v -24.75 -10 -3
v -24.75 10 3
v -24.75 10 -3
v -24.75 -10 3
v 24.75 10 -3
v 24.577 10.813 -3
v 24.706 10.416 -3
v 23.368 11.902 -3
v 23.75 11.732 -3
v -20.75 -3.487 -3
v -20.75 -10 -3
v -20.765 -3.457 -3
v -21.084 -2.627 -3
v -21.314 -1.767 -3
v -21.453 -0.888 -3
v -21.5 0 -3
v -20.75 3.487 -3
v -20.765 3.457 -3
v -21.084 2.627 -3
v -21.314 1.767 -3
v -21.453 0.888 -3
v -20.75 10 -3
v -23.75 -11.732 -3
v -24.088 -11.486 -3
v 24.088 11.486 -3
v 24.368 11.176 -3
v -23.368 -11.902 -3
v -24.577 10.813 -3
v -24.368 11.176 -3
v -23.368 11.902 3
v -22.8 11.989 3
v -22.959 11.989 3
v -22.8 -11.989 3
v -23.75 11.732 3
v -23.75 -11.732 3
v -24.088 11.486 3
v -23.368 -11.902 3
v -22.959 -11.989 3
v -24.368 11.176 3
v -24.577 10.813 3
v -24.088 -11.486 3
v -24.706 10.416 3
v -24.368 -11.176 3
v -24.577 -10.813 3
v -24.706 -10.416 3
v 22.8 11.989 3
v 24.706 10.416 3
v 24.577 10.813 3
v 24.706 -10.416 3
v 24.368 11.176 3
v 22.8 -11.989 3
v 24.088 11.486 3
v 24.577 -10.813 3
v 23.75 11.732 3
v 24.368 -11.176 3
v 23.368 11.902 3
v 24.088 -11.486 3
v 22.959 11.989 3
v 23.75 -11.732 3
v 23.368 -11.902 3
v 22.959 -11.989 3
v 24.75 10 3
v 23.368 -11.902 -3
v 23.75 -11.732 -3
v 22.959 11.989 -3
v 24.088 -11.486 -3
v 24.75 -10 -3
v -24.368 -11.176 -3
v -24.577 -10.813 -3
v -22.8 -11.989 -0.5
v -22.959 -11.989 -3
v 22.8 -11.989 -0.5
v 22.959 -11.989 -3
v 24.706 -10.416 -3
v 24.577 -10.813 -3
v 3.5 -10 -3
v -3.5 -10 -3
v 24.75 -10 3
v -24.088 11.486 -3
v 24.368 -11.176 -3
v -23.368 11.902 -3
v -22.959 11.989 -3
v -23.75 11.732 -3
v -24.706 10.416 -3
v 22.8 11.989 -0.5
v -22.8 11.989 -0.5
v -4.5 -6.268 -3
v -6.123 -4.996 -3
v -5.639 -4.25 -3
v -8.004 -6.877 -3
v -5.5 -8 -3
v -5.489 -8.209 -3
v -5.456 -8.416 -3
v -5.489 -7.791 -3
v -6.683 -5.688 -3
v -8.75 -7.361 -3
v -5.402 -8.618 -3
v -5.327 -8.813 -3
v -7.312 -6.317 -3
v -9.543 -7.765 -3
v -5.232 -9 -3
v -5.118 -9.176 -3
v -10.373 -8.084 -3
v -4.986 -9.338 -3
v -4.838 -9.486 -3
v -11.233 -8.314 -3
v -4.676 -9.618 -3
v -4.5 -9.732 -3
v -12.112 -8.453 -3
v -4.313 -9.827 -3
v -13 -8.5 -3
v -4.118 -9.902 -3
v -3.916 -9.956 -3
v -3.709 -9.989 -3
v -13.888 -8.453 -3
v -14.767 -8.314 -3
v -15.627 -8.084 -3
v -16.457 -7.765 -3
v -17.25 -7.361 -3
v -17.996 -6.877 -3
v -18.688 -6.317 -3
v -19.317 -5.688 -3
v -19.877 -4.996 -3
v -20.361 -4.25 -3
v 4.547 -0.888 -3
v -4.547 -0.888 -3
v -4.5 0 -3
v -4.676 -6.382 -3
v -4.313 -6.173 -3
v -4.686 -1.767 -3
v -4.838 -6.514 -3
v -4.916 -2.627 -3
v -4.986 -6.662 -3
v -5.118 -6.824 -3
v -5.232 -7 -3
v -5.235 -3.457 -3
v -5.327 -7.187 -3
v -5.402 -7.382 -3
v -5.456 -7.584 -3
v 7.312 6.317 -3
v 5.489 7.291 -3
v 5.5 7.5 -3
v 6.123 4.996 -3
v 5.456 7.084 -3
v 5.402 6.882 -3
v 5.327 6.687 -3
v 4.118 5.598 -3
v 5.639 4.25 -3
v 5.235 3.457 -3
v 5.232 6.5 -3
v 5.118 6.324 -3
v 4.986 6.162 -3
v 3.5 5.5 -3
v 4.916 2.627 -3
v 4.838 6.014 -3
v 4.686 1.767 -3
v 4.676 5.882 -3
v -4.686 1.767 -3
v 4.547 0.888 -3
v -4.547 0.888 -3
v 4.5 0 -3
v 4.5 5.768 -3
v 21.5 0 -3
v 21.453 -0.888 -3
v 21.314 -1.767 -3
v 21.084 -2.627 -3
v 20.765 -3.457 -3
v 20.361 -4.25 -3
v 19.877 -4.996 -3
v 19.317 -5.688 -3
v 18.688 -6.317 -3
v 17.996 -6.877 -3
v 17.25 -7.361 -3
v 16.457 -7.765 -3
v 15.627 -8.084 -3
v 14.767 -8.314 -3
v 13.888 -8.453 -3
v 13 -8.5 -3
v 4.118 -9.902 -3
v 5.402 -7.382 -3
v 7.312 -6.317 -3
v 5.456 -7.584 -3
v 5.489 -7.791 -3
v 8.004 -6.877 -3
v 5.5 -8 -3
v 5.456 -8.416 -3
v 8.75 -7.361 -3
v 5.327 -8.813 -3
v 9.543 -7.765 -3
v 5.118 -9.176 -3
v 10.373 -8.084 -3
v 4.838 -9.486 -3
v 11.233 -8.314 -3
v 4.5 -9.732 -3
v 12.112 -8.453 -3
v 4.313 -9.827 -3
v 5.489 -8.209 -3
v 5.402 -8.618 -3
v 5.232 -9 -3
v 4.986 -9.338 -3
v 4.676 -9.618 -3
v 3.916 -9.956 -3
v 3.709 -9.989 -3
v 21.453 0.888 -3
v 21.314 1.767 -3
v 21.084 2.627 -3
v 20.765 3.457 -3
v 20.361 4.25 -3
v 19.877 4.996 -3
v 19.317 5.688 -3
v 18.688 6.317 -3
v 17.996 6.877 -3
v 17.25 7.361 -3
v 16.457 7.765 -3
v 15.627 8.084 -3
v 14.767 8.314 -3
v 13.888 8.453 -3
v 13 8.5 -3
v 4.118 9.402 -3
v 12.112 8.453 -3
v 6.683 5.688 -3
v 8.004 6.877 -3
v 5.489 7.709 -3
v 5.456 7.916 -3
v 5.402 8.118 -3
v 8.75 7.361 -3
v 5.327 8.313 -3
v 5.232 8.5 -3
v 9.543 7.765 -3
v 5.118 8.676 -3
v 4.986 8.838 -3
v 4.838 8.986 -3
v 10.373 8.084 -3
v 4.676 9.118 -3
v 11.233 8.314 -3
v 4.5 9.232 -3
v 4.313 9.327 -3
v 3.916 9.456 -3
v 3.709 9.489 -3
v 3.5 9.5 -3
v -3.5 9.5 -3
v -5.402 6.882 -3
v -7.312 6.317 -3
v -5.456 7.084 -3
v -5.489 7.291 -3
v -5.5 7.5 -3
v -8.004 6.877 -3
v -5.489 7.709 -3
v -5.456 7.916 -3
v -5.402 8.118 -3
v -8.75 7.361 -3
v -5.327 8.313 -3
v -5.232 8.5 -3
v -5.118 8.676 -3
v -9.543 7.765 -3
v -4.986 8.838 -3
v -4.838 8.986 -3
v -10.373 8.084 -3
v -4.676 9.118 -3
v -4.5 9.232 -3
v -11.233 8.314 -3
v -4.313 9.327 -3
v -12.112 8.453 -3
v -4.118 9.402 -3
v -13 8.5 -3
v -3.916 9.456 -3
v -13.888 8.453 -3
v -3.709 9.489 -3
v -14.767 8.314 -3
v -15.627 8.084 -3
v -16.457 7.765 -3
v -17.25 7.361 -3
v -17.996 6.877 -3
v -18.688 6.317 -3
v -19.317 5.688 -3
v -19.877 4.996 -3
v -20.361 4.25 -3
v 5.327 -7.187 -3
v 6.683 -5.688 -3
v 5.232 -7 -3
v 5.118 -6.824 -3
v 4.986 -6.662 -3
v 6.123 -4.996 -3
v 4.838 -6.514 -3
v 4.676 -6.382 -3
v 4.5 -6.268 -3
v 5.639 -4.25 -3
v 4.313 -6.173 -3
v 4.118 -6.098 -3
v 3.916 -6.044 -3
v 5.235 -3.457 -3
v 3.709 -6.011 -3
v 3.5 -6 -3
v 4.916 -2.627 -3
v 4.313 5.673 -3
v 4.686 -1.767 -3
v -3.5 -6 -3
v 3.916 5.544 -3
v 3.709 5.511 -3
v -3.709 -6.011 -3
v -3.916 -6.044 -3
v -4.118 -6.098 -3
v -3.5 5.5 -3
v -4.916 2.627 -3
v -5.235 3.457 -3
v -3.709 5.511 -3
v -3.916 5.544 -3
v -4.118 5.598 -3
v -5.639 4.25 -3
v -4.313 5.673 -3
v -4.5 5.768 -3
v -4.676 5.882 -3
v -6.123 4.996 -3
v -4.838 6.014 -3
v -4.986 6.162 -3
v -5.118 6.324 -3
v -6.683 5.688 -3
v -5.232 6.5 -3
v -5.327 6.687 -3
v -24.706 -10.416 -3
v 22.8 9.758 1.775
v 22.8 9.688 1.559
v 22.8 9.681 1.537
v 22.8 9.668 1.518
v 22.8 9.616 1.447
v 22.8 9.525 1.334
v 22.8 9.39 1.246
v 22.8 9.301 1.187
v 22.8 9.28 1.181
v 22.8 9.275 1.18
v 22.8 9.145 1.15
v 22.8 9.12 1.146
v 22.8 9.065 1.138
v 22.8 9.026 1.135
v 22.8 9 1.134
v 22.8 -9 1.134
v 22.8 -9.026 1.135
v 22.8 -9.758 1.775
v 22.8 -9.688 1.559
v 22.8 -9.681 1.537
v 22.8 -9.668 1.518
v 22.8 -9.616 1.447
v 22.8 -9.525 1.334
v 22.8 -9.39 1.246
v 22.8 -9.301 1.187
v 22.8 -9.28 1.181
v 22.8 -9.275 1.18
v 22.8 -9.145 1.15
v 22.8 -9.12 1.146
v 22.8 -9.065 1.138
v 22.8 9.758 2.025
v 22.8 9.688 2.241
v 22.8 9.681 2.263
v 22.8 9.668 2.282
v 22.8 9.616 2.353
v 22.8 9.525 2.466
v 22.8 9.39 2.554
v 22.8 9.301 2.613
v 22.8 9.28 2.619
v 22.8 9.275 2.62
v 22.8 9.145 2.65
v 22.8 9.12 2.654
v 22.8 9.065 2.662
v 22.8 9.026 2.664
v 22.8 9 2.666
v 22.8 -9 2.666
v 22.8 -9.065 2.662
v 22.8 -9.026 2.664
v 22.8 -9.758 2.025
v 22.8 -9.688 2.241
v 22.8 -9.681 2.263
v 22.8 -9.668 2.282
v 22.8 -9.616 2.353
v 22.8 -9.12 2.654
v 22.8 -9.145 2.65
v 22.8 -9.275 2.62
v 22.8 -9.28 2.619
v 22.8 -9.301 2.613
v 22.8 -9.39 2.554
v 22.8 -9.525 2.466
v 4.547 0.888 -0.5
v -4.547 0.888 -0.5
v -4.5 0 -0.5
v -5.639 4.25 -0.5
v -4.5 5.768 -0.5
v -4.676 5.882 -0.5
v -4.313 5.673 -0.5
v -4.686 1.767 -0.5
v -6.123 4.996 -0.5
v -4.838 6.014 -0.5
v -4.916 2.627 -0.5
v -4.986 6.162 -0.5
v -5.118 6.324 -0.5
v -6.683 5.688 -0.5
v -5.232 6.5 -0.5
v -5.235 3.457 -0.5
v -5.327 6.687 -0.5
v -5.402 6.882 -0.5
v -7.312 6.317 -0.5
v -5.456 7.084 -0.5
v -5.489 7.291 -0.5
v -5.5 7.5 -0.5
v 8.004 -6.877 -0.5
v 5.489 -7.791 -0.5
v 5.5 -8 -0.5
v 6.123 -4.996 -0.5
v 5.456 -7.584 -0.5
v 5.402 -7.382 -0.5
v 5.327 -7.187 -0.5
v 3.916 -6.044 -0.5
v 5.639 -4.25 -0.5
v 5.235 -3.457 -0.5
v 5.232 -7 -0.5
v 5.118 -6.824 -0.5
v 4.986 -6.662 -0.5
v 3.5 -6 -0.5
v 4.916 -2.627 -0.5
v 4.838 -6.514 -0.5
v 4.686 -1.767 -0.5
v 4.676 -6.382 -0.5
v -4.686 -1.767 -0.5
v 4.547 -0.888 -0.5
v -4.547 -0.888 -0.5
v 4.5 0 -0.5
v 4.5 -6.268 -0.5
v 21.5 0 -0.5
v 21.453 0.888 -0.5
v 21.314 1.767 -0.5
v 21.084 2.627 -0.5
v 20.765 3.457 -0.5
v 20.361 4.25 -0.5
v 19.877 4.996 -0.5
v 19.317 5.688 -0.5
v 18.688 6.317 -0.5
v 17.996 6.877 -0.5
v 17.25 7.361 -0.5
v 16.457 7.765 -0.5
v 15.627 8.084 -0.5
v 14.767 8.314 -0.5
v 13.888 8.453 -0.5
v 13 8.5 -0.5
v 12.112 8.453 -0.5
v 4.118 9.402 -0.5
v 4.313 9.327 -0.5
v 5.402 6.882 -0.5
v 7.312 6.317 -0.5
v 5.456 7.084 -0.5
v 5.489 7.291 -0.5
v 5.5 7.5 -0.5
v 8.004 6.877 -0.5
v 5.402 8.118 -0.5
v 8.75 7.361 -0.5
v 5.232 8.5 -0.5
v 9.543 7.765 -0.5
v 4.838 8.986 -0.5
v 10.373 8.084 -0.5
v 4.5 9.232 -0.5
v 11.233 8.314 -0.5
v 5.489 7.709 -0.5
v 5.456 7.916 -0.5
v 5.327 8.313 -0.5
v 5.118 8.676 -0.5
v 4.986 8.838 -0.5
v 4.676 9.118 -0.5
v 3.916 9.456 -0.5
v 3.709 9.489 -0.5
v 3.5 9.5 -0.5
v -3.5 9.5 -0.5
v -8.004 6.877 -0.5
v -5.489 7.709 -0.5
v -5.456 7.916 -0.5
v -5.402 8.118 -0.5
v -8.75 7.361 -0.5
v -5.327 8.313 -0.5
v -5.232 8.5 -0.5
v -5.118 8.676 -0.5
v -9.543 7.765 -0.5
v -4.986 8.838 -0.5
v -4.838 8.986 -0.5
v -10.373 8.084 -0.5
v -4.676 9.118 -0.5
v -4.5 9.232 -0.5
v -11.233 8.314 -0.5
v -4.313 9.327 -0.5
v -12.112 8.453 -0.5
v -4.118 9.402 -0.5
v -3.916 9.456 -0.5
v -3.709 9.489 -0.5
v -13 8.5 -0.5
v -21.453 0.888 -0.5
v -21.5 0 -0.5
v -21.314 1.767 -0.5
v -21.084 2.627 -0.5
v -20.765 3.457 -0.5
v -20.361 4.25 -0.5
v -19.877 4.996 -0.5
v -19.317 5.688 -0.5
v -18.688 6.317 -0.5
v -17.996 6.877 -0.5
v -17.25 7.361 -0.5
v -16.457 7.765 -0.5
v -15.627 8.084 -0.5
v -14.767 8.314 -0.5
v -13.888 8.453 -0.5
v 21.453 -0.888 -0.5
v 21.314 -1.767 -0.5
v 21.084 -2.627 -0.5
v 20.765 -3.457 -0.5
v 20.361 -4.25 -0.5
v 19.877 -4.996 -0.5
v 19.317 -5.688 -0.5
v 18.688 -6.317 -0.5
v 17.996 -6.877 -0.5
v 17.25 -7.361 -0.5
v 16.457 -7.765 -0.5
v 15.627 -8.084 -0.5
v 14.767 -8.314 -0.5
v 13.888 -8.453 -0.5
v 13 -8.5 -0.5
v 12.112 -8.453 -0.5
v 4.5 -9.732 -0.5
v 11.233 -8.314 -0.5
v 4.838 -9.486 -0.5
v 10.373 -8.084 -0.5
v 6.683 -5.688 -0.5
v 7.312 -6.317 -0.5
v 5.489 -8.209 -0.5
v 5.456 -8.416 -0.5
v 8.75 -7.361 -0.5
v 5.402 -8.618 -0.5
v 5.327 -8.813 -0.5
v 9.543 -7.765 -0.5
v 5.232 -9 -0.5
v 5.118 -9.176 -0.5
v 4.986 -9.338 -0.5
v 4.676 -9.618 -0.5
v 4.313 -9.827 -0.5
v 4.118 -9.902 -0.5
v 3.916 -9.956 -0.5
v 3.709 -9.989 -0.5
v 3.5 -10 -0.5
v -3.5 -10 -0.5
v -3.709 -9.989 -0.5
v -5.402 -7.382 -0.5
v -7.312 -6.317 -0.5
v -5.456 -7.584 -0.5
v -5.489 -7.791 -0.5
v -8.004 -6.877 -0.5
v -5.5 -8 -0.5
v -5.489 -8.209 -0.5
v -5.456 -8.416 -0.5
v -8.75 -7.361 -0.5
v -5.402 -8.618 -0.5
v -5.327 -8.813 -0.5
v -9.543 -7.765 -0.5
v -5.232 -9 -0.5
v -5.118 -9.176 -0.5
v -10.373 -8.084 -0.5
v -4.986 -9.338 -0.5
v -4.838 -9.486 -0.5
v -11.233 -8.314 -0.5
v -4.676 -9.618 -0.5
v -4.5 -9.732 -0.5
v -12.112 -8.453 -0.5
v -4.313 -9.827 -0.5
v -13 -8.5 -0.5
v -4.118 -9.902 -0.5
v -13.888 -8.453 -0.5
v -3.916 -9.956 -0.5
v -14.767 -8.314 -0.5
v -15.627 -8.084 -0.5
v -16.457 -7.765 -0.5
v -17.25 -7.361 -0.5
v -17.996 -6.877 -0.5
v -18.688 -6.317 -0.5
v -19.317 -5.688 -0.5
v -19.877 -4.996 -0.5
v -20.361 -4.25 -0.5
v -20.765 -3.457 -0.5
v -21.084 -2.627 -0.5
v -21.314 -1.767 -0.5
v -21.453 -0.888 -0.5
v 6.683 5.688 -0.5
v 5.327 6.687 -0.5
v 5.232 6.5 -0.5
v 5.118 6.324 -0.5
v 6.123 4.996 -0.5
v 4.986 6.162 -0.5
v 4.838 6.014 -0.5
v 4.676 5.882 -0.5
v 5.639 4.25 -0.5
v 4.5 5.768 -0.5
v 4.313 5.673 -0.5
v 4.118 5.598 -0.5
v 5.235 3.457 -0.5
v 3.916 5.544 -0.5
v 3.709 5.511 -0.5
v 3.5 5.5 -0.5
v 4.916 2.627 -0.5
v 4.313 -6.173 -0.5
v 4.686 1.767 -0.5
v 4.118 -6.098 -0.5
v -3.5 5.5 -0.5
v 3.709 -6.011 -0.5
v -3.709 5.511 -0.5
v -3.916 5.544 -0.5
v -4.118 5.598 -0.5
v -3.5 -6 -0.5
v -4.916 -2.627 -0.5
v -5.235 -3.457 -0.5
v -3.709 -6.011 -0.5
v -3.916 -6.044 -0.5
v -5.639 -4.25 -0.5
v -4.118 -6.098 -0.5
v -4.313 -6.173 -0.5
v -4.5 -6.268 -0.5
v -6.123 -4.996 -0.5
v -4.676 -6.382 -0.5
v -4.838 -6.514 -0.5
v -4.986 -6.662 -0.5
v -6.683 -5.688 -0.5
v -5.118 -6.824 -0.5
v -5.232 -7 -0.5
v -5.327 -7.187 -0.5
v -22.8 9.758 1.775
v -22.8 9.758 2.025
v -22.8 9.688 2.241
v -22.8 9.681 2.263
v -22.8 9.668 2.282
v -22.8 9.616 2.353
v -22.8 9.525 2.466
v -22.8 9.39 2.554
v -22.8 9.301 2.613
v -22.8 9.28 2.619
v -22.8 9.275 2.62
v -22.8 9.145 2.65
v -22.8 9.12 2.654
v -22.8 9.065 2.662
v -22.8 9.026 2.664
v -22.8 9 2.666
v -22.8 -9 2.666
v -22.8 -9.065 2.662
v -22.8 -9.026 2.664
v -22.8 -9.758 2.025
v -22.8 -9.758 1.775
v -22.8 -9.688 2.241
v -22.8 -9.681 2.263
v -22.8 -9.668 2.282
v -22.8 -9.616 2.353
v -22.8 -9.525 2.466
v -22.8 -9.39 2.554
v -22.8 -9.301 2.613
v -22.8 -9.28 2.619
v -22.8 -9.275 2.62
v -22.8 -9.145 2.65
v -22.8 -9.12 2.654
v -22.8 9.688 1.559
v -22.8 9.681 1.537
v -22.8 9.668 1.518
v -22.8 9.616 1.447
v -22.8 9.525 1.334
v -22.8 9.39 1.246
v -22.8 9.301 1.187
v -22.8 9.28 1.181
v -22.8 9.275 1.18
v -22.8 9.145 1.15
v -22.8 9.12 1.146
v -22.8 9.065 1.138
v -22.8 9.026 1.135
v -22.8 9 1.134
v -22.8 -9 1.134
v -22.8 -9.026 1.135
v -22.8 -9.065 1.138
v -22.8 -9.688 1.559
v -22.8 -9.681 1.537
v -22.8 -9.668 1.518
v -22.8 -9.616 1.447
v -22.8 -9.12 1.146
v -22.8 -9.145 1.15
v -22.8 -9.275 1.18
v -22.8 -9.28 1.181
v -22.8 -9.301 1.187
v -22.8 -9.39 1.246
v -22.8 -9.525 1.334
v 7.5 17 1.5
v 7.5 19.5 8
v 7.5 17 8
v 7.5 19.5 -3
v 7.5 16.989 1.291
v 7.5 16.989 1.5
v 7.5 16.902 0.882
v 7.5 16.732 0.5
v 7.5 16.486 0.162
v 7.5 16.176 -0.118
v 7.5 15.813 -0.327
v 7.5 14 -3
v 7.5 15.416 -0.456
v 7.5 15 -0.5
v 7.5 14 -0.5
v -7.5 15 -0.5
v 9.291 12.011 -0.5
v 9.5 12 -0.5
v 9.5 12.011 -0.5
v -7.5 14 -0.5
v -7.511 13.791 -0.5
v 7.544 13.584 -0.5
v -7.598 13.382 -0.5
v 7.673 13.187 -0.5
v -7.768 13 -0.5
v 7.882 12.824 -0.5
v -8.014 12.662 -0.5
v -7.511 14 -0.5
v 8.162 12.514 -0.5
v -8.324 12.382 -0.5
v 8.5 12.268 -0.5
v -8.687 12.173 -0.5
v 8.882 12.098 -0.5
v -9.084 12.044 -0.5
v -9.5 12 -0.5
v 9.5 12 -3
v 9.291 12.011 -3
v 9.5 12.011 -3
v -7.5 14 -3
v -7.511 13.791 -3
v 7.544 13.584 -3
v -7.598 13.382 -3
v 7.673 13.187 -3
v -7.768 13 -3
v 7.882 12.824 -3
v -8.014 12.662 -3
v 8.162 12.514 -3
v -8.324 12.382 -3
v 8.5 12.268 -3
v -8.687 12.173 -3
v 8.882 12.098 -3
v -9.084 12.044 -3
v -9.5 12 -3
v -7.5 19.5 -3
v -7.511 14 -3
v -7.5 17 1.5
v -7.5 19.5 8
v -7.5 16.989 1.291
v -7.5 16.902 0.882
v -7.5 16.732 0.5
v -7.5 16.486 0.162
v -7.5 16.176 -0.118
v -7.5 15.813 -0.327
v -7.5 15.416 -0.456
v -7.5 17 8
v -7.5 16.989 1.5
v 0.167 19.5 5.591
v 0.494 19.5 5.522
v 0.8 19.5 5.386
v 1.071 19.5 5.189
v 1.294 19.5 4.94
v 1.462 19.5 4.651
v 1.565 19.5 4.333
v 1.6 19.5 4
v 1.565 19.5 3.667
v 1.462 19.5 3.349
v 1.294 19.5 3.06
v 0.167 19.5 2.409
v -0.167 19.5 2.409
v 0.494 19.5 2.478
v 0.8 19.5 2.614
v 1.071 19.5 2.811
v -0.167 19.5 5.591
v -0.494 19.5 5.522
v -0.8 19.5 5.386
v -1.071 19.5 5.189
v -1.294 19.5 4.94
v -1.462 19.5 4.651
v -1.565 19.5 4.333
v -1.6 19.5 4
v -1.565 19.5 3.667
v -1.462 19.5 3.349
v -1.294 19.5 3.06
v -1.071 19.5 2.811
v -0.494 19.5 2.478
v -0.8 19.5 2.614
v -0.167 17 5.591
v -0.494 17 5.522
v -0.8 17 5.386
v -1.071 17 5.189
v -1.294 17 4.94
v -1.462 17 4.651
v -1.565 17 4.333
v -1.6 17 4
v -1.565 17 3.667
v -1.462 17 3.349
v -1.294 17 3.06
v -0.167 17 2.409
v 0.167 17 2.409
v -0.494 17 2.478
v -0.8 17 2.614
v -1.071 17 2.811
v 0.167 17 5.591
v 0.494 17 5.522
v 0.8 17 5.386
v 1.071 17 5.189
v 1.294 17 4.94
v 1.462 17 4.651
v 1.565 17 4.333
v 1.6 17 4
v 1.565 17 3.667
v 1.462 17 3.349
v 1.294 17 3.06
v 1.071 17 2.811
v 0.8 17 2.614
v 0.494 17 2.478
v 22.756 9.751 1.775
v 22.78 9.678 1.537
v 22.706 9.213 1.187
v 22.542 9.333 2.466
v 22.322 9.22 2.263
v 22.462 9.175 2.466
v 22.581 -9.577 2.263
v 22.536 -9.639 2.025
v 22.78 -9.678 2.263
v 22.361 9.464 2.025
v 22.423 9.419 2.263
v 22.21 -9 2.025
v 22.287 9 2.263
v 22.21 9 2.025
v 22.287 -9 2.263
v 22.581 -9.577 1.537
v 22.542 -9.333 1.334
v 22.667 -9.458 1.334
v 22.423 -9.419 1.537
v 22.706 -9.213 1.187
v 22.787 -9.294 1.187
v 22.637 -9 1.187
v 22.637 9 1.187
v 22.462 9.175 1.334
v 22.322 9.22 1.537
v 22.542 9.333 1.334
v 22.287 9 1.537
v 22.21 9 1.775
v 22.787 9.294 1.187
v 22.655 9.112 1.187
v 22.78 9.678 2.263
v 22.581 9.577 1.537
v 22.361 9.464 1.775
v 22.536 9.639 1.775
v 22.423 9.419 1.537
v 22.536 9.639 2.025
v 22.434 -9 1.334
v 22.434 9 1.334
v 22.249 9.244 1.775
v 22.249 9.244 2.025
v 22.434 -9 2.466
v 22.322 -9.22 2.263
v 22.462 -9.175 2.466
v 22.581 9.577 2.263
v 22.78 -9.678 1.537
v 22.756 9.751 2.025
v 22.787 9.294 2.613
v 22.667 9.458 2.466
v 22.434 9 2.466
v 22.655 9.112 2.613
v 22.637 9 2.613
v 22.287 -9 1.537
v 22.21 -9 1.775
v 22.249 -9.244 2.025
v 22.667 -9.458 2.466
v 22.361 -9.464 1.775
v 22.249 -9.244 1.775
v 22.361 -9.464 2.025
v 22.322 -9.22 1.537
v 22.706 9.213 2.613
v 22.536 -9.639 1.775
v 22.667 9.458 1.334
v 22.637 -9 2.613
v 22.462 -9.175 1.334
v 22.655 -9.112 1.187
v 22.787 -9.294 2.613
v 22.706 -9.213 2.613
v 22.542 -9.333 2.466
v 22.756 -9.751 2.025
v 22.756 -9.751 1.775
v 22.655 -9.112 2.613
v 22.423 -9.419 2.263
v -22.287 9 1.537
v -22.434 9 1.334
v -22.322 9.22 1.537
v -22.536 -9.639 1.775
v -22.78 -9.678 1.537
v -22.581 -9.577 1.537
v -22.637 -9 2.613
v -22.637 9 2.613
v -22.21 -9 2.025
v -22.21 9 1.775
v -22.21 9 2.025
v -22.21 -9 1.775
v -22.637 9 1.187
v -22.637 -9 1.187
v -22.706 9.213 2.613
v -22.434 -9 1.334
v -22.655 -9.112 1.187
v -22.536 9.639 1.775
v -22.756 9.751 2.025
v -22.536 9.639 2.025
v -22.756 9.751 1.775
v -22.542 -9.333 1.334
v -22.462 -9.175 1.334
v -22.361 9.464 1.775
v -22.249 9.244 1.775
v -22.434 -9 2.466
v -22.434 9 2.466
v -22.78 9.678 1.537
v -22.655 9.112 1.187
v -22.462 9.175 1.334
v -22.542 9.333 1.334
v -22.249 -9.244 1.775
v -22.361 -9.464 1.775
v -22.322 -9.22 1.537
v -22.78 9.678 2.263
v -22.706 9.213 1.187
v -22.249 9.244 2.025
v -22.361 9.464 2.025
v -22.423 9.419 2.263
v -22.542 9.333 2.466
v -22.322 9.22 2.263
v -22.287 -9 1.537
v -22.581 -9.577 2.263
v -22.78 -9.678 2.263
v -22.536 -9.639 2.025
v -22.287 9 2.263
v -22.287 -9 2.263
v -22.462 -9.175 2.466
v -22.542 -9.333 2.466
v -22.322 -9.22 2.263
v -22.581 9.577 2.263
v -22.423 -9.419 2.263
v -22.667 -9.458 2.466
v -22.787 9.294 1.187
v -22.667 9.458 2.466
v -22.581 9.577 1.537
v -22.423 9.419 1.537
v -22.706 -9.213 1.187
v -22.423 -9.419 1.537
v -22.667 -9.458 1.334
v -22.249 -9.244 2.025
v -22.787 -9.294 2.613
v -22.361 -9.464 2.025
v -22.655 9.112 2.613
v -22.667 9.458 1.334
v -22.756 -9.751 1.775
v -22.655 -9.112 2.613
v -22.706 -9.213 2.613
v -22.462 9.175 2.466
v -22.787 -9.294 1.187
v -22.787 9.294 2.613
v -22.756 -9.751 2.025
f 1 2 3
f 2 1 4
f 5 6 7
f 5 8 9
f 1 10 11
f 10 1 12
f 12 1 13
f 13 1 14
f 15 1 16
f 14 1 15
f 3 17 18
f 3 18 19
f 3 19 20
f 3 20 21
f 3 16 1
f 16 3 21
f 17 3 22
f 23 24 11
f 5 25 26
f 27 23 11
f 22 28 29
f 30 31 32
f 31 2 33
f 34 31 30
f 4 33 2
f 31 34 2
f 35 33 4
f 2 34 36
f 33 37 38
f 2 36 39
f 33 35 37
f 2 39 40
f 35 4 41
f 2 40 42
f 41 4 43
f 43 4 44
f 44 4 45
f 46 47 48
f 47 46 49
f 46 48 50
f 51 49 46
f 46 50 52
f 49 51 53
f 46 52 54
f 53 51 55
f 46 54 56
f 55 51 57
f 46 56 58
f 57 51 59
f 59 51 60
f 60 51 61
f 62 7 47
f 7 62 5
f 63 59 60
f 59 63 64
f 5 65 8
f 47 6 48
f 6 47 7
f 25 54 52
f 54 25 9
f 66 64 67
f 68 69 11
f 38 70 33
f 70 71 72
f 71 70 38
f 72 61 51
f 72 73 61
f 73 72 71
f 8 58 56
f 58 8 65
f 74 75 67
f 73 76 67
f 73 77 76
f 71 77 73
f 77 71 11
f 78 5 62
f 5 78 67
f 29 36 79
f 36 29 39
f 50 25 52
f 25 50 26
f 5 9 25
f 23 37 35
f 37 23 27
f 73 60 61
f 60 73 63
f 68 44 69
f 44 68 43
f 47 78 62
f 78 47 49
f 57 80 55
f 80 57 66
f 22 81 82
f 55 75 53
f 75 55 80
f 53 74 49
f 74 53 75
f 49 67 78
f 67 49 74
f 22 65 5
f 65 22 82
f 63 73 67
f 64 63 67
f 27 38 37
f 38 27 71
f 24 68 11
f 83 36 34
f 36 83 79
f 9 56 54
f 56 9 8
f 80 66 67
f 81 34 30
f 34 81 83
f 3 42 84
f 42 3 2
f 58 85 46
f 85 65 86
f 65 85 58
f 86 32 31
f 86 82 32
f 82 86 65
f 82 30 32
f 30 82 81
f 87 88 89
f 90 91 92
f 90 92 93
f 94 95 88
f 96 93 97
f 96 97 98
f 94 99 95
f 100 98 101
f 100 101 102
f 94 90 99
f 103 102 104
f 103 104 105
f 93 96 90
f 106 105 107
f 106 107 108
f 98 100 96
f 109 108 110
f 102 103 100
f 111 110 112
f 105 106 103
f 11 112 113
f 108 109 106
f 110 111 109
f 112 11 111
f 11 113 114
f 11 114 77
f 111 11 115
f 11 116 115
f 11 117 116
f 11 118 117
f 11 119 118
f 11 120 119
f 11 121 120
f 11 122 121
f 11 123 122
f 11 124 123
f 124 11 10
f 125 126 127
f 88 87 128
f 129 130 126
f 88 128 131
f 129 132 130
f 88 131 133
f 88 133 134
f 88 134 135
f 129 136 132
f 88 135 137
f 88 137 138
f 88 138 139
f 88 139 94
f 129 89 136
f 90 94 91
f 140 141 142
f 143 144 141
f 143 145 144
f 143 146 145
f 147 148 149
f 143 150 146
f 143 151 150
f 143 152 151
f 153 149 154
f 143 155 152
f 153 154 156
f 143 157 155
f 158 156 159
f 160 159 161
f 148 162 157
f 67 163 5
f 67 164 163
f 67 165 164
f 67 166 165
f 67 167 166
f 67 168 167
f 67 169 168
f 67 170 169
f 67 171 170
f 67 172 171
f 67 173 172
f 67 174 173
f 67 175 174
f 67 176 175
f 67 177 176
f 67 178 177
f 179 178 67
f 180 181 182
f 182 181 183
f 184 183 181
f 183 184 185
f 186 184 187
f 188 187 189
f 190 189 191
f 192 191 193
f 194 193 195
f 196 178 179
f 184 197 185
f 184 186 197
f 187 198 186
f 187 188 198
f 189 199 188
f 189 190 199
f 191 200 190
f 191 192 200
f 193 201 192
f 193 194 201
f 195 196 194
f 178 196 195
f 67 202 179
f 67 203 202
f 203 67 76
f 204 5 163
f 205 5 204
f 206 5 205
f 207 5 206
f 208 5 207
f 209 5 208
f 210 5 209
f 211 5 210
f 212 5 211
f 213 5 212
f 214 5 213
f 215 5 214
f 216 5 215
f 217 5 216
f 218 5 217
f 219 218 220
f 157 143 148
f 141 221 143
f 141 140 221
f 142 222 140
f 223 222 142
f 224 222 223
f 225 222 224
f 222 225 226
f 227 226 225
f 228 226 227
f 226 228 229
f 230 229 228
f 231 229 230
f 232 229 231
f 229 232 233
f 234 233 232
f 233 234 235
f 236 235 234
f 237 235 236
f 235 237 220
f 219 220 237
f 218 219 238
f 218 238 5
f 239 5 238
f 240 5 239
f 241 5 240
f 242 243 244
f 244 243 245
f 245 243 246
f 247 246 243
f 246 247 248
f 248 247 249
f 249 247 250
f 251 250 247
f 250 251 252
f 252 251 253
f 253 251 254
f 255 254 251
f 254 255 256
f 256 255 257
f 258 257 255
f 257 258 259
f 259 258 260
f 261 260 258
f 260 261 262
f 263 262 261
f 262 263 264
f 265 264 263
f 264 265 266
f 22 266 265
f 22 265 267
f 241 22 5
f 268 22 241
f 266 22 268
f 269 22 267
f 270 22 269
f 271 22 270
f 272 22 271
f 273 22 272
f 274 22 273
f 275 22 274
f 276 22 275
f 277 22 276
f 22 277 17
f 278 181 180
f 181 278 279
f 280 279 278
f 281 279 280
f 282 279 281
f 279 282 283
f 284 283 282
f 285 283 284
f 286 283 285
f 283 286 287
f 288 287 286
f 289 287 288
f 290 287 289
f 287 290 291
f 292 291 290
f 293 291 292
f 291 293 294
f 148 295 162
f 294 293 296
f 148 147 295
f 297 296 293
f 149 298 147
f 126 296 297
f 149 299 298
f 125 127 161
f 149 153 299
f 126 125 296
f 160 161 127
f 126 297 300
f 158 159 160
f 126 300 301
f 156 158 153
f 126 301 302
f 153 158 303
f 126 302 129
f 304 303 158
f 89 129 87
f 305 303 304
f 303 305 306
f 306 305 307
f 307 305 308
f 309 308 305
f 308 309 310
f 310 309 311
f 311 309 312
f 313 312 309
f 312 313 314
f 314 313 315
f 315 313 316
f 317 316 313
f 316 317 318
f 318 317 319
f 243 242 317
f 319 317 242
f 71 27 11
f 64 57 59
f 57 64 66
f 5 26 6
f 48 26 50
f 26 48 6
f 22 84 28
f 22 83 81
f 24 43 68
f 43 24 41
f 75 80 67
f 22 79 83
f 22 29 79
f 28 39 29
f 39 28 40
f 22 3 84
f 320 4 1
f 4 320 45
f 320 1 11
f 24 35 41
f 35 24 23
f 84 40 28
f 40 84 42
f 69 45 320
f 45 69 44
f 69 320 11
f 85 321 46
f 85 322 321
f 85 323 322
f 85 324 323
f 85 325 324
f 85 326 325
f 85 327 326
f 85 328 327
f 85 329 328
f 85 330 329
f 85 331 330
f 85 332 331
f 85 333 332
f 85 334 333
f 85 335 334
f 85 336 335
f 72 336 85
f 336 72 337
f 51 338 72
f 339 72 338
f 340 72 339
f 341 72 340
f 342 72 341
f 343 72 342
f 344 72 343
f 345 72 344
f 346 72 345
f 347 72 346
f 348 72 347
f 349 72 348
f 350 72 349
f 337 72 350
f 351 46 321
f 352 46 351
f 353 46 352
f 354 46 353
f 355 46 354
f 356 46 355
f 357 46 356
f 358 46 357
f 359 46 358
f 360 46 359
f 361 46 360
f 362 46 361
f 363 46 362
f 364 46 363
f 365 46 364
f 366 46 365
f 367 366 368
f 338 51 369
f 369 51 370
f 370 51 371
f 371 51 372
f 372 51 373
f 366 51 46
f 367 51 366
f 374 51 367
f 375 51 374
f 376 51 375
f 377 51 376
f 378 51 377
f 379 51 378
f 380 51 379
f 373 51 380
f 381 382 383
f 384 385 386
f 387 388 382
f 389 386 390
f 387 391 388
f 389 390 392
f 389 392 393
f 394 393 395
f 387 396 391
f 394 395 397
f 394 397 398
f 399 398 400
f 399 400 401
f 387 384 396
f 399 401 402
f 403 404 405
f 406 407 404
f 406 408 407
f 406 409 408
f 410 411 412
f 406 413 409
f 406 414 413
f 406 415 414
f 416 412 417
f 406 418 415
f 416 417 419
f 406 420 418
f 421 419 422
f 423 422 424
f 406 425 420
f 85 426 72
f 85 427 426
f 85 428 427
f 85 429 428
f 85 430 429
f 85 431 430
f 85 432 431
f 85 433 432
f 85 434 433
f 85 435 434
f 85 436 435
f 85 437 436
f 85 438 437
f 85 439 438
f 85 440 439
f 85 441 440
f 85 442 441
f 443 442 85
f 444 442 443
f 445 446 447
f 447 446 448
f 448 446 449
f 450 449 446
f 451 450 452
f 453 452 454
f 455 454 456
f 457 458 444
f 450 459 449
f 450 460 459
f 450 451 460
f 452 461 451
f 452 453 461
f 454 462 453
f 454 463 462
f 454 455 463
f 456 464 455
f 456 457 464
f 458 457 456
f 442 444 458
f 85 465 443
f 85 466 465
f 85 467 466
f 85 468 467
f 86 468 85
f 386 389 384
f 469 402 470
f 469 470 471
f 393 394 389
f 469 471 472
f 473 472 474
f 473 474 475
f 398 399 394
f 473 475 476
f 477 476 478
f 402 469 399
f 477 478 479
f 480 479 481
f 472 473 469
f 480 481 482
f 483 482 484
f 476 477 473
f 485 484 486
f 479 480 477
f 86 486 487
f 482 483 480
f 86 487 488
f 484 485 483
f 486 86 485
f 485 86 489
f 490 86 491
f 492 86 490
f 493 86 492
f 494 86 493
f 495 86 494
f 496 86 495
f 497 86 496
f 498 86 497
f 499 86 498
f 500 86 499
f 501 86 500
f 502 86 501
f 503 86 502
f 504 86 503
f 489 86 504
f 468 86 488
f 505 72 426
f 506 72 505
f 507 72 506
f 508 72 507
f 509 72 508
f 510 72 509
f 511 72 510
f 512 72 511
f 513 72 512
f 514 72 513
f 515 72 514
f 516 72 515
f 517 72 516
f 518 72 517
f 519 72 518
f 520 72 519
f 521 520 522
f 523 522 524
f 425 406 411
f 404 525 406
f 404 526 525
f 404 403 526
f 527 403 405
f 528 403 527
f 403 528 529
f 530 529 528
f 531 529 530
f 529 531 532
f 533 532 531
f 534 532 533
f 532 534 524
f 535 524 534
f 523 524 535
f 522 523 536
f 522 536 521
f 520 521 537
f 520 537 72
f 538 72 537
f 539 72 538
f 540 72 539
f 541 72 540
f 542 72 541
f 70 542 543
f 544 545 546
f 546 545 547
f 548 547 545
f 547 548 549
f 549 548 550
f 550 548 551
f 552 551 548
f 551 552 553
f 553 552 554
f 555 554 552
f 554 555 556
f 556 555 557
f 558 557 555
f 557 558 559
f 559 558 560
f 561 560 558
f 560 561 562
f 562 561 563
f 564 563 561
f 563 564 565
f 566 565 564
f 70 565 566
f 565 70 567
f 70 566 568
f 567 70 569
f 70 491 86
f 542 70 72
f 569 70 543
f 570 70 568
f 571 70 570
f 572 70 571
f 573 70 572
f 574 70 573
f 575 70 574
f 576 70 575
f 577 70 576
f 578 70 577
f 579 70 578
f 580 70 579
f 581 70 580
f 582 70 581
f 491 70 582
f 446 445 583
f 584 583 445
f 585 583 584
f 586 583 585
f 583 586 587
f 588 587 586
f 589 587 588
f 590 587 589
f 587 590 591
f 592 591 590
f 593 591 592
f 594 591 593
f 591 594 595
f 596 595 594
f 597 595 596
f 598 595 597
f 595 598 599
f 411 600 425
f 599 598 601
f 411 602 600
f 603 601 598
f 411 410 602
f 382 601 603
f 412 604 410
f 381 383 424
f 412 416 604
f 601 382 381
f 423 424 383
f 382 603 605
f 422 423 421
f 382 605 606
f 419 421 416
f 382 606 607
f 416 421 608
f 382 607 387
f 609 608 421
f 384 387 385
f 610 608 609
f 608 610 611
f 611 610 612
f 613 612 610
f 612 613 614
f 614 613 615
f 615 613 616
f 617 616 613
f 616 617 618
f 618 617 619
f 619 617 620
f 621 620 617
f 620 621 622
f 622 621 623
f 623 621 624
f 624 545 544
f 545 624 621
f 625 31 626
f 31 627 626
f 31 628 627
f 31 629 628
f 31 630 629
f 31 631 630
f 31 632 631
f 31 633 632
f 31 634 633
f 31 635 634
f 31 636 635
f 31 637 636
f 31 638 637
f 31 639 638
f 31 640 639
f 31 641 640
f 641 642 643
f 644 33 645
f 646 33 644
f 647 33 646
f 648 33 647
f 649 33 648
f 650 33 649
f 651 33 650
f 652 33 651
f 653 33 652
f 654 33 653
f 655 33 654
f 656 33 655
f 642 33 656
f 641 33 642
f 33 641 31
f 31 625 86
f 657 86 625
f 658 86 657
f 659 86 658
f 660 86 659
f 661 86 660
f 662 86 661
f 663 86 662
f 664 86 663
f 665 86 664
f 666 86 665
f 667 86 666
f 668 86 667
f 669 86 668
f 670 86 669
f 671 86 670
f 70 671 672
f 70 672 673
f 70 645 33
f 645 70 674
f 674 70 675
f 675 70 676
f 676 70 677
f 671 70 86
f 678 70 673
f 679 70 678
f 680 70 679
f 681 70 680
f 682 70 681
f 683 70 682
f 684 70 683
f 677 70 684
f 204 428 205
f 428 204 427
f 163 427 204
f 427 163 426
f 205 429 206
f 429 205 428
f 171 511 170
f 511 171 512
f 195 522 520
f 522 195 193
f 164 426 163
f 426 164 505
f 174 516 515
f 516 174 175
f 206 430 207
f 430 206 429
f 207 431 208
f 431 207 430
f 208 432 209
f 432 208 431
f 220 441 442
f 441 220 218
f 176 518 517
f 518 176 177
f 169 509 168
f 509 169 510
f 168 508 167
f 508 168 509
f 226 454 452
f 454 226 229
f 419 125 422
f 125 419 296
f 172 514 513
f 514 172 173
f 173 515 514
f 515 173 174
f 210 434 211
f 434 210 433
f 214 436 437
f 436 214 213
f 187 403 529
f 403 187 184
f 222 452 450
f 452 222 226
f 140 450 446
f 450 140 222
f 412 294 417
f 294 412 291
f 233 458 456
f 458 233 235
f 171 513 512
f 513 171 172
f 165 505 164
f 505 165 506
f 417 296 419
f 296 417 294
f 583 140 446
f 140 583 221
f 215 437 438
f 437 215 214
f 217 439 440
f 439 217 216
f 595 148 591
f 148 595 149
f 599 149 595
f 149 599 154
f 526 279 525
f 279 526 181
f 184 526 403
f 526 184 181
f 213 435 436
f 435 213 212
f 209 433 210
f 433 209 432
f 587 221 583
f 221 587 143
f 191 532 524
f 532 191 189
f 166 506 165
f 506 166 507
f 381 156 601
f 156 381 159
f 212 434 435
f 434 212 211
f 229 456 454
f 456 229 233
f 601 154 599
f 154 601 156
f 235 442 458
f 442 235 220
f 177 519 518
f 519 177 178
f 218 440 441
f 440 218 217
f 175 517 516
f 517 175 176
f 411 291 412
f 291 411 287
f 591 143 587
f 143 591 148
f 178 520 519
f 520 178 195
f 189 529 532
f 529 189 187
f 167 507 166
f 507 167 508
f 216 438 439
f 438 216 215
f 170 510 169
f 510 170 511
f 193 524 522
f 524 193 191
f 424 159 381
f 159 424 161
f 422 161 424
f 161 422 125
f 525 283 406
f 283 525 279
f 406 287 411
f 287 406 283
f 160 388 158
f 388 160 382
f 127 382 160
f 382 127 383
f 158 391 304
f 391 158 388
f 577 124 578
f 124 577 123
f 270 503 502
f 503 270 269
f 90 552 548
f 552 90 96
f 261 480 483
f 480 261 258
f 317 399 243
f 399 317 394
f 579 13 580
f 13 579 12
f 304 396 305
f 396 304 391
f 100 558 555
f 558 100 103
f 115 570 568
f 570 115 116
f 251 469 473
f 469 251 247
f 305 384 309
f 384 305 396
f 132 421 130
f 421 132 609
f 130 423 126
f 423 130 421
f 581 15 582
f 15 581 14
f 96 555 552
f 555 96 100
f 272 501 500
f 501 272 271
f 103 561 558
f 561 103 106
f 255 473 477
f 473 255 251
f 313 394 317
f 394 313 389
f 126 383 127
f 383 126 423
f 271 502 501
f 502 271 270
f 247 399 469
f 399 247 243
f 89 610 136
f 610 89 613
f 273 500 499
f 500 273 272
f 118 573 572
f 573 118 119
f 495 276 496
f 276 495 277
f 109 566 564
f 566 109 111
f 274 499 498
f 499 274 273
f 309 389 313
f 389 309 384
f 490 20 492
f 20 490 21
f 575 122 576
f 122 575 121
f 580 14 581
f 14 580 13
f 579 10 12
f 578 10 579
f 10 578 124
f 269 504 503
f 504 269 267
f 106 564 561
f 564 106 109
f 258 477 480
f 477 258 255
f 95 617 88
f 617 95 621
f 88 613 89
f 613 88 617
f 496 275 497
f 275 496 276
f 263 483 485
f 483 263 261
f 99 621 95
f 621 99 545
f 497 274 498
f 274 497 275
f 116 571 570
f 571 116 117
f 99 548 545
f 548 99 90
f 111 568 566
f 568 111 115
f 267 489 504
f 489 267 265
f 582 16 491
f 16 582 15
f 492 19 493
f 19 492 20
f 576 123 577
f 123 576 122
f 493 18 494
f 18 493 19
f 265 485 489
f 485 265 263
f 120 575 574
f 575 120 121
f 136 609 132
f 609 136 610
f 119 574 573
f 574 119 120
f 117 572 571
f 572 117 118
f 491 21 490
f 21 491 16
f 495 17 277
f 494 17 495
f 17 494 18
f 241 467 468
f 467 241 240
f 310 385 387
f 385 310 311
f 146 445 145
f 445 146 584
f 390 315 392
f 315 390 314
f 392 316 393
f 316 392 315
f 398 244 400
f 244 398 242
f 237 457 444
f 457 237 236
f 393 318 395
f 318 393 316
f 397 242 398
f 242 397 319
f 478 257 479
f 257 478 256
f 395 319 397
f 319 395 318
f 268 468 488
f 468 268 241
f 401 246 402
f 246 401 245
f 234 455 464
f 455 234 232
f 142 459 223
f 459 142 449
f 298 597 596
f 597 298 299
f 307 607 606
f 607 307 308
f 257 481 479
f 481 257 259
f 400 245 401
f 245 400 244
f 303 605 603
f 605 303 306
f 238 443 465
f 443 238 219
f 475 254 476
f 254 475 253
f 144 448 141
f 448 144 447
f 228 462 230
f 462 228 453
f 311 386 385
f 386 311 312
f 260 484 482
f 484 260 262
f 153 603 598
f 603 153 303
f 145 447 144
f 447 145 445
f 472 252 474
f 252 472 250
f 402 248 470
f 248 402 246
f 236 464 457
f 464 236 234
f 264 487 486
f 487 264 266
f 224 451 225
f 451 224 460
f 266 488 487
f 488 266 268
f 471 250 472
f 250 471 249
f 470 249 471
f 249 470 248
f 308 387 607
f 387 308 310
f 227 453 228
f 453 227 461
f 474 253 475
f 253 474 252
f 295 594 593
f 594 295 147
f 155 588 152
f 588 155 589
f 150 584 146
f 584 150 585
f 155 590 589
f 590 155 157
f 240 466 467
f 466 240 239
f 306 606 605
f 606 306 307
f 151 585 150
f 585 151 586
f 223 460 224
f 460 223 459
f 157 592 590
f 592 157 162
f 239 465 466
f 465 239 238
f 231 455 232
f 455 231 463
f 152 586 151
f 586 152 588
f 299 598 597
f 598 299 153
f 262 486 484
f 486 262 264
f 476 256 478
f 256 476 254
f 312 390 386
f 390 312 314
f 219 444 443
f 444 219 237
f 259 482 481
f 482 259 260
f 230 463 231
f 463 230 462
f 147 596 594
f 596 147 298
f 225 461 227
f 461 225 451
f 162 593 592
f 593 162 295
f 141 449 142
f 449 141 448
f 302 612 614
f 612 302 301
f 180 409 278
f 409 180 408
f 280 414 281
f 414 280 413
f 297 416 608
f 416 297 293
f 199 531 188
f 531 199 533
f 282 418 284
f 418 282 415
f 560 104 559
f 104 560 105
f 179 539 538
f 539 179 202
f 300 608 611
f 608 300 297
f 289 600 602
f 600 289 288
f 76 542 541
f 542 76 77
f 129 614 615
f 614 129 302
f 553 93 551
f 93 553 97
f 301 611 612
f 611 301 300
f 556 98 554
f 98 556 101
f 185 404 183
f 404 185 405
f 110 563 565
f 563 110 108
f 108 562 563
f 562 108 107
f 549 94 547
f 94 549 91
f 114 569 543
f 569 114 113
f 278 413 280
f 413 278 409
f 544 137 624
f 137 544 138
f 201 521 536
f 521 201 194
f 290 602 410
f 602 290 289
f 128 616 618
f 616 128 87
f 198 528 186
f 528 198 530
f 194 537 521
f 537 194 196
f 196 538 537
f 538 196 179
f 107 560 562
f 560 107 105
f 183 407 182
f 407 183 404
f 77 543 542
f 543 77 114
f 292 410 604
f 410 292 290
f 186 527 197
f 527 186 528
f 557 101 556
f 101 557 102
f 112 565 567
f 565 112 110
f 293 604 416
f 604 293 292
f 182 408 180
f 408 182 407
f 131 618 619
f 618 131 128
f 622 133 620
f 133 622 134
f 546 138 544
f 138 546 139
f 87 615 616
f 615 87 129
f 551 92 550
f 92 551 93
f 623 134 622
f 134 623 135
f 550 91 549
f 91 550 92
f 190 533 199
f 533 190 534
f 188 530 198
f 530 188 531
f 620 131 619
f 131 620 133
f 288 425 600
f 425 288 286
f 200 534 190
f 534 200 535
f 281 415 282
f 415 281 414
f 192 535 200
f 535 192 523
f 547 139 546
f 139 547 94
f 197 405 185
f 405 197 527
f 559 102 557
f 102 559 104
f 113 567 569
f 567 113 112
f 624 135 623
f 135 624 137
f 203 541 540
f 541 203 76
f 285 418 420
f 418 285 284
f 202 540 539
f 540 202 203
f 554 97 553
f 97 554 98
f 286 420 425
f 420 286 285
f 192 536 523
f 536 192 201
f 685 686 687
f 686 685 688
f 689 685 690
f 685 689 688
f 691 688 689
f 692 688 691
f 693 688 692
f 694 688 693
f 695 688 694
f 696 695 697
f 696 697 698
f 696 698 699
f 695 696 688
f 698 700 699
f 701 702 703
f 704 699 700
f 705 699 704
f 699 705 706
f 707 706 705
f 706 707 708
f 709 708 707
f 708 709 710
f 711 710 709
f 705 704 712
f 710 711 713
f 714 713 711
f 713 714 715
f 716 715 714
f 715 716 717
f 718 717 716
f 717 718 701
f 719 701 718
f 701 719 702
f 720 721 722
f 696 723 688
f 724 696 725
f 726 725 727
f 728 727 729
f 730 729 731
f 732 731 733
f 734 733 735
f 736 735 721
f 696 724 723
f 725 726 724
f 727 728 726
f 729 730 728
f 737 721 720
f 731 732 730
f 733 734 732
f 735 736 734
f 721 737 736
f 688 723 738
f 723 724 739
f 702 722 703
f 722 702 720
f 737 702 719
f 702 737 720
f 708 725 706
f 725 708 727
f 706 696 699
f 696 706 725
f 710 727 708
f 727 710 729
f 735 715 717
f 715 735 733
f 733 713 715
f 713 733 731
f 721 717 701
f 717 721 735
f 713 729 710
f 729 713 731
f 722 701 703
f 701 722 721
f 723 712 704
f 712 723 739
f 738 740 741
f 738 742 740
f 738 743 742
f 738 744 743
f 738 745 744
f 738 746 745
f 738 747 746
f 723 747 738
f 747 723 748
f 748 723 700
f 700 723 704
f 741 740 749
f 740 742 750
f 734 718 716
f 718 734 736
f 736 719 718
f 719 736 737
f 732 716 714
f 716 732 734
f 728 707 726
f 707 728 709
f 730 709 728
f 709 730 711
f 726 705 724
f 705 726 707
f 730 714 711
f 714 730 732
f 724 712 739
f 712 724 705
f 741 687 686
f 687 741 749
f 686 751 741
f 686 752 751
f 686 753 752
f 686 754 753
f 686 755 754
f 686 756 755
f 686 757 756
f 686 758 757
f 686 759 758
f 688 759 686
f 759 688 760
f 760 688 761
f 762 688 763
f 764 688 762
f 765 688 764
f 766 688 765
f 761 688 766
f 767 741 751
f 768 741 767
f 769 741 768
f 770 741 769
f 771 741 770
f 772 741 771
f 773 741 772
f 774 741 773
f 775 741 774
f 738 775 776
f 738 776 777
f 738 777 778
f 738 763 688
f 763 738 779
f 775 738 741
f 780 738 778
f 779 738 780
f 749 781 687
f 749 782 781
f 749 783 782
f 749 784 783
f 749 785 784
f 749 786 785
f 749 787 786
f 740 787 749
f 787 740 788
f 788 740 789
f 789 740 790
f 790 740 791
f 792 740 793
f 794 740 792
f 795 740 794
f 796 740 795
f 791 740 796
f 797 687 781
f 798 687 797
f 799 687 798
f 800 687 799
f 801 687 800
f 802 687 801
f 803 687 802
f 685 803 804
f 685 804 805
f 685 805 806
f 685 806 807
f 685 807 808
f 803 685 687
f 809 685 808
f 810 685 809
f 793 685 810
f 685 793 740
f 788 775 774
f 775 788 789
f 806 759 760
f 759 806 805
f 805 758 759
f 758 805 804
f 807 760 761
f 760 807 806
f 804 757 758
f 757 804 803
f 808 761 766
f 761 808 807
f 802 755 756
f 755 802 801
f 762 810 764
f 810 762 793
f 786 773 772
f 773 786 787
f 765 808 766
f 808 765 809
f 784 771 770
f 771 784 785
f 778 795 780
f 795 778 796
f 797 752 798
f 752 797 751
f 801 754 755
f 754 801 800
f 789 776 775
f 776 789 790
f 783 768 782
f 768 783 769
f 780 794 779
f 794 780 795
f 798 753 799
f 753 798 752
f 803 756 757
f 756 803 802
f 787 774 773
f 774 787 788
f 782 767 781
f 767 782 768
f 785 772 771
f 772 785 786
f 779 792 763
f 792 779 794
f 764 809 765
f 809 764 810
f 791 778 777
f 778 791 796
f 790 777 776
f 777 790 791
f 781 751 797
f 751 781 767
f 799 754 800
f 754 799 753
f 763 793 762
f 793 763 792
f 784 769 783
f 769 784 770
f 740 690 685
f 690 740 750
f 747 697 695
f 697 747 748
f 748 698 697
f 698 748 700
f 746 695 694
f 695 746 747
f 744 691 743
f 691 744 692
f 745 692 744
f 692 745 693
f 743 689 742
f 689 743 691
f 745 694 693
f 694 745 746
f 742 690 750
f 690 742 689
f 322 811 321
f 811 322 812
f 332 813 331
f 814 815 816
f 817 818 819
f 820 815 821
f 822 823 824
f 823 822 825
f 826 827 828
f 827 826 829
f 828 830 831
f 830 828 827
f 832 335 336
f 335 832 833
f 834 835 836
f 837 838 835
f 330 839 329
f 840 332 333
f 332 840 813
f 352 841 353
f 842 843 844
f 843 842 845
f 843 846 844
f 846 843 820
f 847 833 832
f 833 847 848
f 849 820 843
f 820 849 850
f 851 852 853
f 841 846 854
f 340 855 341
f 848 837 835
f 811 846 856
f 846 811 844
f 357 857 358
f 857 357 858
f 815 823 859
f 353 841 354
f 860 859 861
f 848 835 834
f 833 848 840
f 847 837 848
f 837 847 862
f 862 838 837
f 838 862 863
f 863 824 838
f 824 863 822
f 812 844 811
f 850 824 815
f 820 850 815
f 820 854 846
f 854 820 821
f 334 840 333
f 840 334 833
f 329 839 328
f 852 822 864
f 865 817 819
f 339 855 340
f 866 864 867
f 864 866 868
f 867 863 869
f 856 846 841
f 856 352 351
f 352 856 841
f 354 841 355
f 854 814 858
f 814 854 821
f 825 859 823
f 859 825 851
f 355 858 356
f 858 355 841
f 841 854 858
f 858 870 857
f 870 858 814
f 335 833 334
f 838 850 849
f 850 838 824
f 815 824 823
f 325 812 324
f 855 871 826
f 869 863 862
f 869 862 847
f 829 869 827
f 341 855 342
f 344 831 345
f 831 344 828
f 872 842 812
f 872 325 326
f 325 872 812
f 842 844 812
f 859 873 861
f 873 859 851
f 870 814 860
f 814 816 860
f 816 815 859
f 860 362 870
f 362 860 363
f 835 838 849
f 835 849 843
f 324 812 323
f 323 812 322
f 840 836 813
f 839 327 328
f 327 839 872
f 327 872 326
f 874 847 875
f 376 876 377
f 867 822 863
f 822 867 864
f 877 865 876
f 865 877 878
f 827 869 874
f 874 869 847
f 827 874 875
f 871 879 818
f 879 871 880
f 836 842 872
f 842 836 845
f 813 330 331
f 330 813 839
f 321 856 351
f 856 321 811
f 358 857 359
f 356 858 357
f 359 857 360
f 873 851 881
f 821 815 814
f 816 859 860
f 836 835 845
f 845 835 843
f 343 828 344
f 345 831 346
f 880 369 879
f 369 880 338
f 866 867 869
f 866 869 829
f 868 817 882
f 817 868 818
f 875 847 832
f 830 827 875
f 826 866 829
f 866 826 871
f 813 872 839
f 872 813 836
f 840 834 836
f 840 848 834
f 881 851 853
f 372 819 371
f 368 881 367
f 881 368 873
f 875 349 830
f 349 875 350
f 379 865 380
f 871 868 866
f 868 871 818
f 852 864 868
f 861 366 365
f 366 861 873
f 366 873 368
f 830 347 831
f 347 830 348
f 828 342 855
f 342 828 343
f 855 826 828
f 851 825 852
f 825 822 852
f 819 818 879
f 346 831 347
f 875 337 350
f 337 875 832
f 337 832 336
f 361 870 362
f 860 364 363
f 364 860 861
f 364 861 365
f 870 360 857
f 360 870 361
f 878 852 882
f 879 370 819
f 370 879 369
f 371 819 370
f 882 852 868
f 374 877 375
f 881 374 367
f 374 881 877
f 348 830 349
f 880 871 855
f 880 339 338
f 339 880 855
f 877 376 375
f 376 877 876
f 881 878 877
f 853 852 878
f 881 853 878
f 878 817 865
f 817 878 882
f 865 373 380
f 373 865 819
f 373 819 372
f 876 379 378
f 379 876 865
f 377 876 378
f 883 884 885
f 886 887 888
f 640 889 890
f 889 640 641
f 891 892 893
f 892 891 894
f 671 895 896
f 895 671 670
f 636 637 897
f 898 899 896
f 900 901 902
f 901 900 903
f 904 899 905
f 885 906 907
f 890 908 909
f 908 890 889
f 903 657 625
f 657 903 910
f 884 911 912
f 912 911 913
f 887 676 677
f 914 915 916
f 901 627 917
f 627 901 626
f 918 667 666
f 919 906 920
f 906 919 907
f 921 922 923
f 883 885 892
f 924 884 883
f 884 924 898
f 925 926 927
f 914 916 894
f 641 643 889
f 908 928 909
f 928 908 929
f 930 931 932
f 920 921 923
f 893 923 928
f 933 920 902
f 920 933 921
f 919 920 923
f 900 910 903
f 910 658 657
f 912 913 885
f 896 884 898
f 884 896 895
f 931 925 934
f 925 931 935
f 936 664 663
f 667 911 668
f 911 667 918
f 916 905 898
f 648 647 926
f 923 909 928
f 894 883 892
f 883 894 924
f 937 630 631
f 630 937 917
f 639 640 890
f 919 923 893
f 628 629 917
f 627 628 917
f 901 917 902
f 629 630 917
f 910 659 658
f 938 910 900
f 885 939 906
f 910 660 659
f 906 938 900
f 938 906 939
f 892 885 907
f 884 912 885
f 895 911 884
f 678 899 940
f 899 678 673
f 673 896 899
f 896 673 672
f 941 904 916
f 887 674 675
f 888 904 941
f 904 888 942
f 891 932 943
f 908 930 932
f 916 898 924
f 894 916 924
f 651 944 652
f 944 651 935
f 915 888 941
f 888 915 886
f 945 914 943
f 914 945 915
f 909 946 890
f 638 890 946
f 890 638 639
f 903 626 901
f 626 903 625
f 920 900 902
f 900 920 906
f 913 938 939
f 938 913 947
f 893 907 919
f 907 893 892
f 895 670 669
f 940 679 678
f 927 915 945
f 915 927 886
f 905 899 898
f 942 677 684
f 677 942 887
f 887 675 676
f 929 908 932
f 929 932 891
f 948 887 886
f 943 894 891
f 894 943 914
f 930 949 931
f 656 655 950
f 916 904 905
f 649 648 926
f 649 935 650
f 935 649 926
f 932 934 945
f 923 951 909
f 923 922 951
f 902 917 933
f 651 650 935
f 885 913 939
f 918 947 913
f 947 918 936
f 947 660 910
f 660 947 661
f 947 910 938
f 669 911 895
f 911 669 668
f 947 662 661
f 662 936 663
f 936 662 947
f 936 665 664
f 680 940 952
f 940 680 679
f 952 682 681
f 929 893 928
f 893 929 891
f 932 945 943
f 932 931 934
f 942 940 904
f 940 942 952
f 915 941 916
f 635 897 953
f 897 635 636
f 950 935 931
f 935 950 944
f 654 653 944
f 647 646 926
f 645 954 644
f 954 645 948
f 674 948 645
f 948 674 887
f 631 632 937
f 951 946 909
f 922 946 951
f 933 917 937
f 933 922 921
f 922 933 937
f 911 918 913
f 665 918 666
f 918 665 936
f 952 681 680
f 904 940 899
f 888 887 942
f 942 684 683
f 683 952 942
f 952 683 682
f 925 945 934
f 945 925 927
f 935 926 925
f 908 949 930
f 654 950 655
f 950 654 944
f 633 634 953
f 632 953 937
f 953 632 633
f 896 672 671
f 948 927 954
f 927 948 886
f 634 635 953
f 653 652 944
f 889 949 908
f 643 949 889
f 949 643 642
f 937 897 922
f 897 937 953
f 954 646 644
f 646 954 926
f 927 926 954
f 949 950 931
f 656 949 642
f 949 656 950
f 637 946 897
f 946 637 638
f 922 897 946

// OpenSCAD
difference()
{
minkowski($fn=30){
cube([45.5,20,6],center=true);
cylinder(d=4,h=0.000001);
}
translate([0,0,2])cube([45.6,25,5],center=true);
    
translate([13,0,-5])cylinder(d=17,h=5,$fn=60);
translate([-13,0,-5])cylinder(d=17,h=5,$fn=60);
hull(){
translate([-3.5,7.5,-5])cylinder(d=4,h=5,$fn=60);
translate([3.5,7.5,-5])cylinder(d=4,h=5,$fn=60);
}
hull(){
translate([-3.5,-8,-5])cylinder(d=4,h=5,$fn=60);
translate([3.5,-8,-5])cylinder(d=4,h=5,$fn=60);
}
}
hull(){
translate([23,9,1.9])sphere(0.8,$fn=20);
translate([23,-9,1.9])sphere(0.8,$fn=20);
}
hull(){
translate([-23,9,1.9])sphere(0.8,$fn=20);
translate([-23,-9,1.9])sphere(0.8,$fn=20);
}
translate([9.5,14,-3])rotate([0,0,180])
scale([1,1,1.25])acuerdo();
translate([-9.5,14,-3])rotate([0,0,-90])
scale([1,1,1.25])acuerdo();

translate([-7.5,12,-3])cube([15,7,2.5]);
difference(){
translate([-7.5,17,-3])cube([15,2.5,11]);
translate([0,0,4])rotate([-90,0,0])
cylinder(d=3.2,h=20,$fn=30);
}
translate([-7.5,15,1.5])scale([7.5,1,1])
rotate([0,90,0])acuerdo();

module acuerdo(){
difference(){
cube(2);
cylinder(d=4,h=2,$fn=30);
}
}
